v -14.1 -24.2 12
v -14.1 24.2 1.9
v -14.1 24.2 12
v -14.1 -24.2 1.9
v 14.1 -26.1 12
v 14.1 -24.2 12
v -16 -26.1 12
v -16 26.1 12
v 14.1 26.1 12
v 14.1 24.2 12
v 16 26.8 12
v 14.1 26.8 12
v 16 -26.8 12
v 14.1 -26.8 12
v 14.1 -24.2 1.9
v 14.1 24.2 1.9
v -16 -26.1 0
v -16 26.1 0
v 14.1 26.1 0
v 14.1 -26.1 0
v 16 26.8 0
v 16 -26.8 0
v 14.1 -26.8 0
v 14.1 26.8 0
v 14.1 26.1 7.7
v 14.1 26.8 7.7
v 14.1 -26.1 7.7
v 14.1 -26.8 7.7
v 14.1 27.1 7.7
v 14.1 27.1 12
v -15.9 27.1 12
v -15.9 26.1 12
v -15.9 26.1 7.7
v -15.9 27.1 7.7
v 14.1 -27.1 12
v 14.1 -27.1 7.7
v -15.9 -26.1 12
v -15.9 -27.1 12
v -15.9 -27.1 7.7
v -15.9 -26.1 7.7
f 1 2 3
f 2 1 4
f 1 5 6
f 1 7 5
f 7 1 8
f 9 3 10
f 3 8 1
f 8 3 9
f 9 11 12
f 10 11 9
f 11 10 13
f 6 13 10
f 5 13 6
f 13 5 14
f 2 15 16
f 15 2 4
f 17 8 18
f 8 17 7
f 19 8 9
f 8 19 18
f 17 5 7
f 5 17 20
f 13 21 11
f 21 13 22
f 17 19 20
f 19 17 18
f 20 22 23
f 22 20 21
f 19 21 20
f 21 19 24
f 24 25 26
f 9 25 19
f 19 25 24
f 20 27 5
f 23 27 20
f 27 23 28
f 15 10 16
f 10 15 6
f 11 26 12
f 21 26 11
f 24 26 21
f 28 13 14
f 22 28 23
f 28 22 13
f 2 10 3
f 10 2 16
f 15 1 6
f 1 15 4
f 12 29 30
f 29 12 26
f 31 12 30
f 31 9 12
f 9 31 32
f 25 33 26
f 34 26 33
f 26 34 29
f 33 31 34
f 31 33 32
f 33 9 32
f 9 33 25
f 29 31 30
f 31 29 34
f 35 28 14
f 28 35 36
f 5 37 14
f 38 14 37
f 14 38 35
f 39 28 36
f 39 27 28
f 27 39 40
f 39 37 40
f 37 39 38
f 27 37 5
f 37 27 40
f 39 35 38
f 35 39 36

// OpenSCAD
// file: ../hdim.scad
module hdim(x1 = 10, x2 = 20, y = 10, dimline_lenght = 9.0) 
{
    dimline_overlap = 0.5;
    dimline_width = 0.3;
    text_size = 2;
    tmp = 2*dimline_overlap+text_size/2;
    text_pos = dimline_lenght>0 ? tmp : -tmp; 
    dimline_abs = dimline_lenght>0 ? dimline_lenght : -dimline_lenght;
    
    color([0,0,0])
    {
        translate([x1,y-dimline_lenght/2,0]) 
            square([dimline_width, 
                dimline_abs + 2*dimline_overlap], 
                center=true, $fs=0.01);
                
        translate([x2,y-dimline_lenght/2,0]) 
            square([dimline_width, 
                dimline_abs + 2*dimline_overlap], 
                center=true, $fs=0.01);

        translate([(x1+x2)/2,y-dimline_lenght,0]) 
            square([x2-x1, 
                dimline_width], 
                center=true, $fs=0.01);
    }
        
    translate([(x1+x2)/2,y-dimline_lenght-text_pos,0]) 
    {
        color([0,0,0])
        cube([text_size * 5, 1.2*text_size, 0.9], center=true);
        
        color([0.8,0.8,0.5,1.0])
        {
            translate([0,0,0.2])
            text(str(0.1*round((x2-x1)*10)), size = text_size, 
                halign = "center",valign = "center");
            translate([0,0,-0.2])
            rotate([0,180,0])
            text(str(0.1*round((x2-x1)*10)), size = text_size, 
                halign = "center",valign = "center");
        }
    }
}

hdim();
// main file
use <../hdim.scad> 

box_l = 32; // Depth max 32.5
opening = 54.2; // opening 53.0, 53.2, 54.0, 54.2 

slider_t = 1; // thickness
slider_w = 4.3; // width
slider_l = 30; // length
slider_m = slider_l; // movement

box_w = opening - 2*slider_t; 
box_h = 12;
plywood_t = 1.9;


module drawer(open = false)
{
  explode = false;
  final_view = false;
  
  edelta = explode ? 12 : 0;
  opaque10 = final_view ? 0 : 0.1;
    
  translate([open?slider_m:0,0,0])
  {  
    color([51/255, 34/255, 6/255, 1-opaque10]) 
    translate([-plywood_t/2,0,plywood_t/2])
    cube([box_l-plywood_t, box_w, plywood_t], center=true);
    
    if (!final_view) {
        hdim(-box_l/2, box_l/2-plywood_t, box_w/2, -2);
        rotate([0,0,90]) 
        hdim(-box_w/2, box_w/2, box_l/2, -5);
    }

    cover_over = 0.7;
    
    color([71/255, 44/255, 16/255, 1-2*opaque10]) {
        translate([-box_l/2+plywood_t/2-edelta,0,box_h/2+plywood_t/2])
        cube([plywood_t, box_w, box_h-plywood_t],
            center=true);
        
        translate([box_l/2-plywood_t/2+edelta,0,box_h/2])
        cube([plywood_t, box_w+2*cover_over, box_h],
            center=true); 
    }

    dim1 = (box_l - 2*plywood_t)/2;
    dim2 = (box_h - plywood_t)/2;
    dim3 = box_h/2;

    if (!final_view) {
        translate([0, -edelta, box_h/2+plywood_t/2]) 
        rotate([0,0,180]) 
        hdim(-dim1, dim1, box_w/2, -5);
        
        translate([0, -edelta-box_w/2+plywood_t/2,
            box_h/2+plywood_t/2]) 
        rotate([0,90,90]) 
        hdim(-dim2, dim2, -dim1, 5);
    }
    color([91/255, 78/255, 66/255, 1-2*opaque10]) {
        translate([0,box_w/2-plywood_t/2+edelta,
            box_h/2+plywood_t/2])
        cube([box_l - 2*plywood_t, plywood_t,
            box_h-plywood_t], center=true);
        
        translate([0,-box_w/2+plywood_t/2-edelta,
            box_h/2+plywood_t/2])
        cube([box_l - 2*plywood_t, plywood_t, 
            box_h-plywood_t], center=true);
    }
    
    if (!final_view) {
        translate([0,0,box_h/2+plywood_t/2])
        rotate([0,0,90]) 
        hdim(-box_w/2-cover_over, 
            box_w/2+cover_over, 
            -box_l/2-edelta, 7); 
        
        translate([edelta+box_l/2-plywood_t/2,
        0, box_h/2]) 
        rotate([0,90,-90]) hdim(-dim3, dim3, 0, -4);
    }
    
    translate([-slider_l + box_l/2 - plywood_t, 
        box_w/2, box_h-slider_w]) 
    slider(open);
    
    translate([-slider_l + box_l/2 - plywood_t, 
        -box_w/2, box_h-slider_w]) 
    mirror([0,1,0]) 
    slider(open);
  }
}        

module slider(open = false)
{
    color([122/255, 162/255, 214/255, 1]) 
    cube([slider_l, slider_t/2, slider_w], center = false);

    translate([open?-slider_m:0,slider_t/2,0])
    color([192/255, 192/255, 255/255, 1]) 
    cube([slider_l, slider_t/2, slider_w], center = false);}



drawer();
